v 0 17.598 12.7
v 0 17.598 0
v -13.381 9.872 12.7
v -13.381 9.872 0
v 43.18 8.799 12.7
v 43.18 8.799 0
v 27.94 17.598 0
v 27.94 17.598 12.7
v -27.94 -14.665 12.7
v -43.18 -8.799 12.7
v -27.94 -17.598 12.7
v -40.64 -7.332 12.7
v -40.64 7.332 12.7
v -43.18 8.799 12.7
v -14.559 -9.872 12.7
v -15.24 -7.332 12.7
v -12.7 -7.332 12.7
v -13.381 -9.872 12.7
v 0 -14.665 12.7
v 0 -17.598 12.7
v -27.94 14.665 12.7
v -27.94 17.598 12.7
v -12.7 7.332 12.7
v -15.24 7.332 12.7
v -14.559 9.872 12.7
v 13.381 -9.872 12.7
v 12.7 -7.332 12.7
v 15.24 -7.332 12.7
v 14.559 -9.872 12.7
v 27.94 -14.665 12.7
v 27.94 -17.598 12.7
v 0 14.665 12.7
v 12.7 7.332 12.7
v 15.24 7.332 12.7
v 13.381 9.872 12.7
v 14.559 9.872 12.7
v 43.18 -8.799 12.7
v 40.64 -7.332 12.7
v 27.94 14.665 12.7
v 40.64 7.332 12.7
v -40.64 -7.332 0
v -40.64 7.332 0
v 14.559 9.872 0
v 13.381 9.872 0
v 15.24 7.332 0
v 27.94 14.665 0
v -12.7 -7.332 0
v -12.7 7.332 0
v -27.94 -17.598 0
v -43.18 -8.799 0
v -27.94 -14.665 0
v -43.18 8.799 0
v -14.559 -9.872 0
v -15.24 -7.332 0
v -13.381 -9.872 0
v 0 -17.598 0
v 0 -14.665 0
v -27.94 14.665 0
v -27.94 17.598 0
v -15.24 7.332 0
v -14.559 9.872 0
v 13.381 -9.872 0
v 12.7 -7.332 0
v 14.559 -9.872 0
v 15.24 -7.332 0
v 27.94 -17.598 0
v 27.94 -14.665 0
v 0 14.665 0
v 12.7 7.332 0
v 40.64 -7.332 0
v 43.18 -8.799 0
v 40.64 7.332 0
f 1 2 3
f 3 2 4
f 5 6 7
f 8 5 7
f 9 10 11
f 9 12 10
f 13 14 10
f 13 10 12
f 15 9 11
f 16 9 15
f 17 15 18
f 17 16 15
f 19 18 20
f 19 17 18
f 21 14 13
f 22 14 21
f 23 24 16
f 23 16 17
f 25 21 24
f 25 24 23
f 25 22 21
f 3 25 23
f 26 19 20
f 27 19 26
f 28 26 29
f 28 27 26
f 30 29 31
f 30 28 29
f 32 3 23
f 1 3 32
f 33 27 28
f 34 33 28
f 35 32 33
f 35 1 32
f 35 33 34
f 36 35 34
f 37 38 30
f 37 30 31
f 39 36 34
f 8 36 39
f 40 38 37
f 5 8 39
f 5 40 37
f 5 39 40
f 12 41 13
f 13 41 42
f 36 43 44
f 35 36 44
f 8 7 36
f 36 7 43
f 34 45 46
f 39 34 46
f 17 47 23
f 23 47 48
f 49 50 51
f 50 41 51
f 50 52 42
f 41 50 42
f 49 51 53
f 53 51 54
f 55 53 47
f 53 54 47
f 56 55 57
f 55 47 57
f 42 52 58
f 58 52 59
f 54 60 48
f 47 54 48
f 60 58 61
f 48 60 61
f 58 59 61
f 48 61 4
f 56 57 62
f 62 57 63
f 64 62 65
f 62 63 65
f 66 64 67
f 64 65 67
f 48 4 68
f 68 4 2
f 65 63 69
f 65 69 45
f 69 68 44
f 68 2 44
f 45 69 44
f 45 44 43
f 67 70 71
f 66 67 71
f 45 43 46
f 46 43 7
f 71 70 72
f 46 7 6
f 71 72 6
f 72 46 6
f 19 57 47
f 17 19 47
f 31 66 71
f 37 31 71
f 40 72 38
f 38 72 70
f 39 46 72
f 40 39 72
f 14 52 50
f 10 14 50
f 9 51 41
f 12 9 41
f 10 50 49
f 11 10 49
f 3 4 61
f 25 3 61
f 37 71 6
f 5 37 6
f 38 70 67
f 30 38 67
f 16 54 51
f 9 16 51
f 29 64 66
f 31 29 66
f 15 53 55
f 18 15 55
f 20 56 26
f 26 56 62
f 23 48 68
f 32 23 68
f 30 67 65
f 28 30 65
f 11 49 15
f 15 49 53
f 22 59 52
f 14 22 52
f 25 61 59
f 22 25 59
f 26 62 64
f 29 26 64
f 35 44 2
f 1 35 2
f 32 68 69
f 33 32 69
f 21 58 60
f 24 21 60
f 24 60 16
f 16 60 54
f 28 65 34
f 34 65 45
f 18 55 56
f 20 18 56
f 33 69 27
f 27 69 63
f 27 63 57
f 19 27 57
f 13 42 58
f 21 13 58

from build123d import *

# Parameters (mm, degrees)
F1_DEPTH = 12.7


with BuildPart() as f1:
    # F0 (on Top) → F1 (new body)
    with BuildSketch(Plane.XY):
        Polygon((-43.18, 8.798818), (-43.18, -8.798818), (-27.94, -17.597636), (-14.559409, -9.872348), (-13.380591, -9.872348), (0, -17.597636), (13.380591, -9.872348), (14.559409, -9.872348), (27.94, -17.597636), (43.18, -8.798818), (43.18, 8.798818), (27.94, 17.597636), (14.559409, 9.872348), (13.380591, 9.872348), (0, 17.597636), (-13.380591, 9.872348), (-14.559409, 9.872348), (-27.94, 17.597636), align=None)
        Polygon((-27.94, 14.664697), (-15.24, 7.332348), (-15.24, -7.332348), (-27.94, -14.664697), (-40.64, -7.332348), (-40.64, 7.332348), align=None, mode=Mode.SUBTRACT)
        Polygon((0, -14.664697), (-12.7, -7.332348), (-12.7, 7.332348), (0, 14.664697), (12.7, 7.332348), (12.7, -7.332348), align=None, mode=Mode.SUBTRACT)
        Polygon((27.94, -14.664697), (15.24, -7.332348), (15.24, 7.332348), (27.94, 14.664697), (40.64, 7.332348), (40.64, -7.332348), align=None, mode=Mode.SUBTRACT)
    extrude(amount=F1_DEPTH)


solid = f1.part
